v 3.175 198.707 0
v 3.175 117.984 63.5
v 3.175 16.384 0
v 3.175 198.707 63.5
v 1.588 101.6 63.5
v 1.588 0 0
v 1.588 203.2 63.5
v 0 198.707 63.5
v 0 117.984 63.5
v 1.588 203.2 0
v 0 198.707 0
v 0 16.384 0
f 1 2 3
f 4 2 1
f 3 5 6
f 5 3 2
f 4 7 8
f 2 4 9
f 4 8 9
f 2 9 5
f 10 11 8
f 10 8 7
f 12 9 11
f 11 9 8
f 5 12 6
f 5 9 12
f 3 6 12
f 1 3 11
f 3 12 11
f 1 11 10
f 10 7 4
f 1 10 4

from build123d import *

# Parameters (mm, degrees)
BOSS_EXTRUDE1_DEPTH     = 3.175
CUT_EXTRUDE1_DEPTH      = 120.85362166
CUT_EXTRUDE1_DEPTH_BACK = 120.85362166
CUT_EXTRUDE2_DEPTH      = 213.914467862
CUT_EXTRUDE2_DEPTH_BACK = 213.914467862


with BuildPart() as part:
    # Sketch1 → Boss-Extrude1 (new body)
    with BuildSketch(Plane.YZ):
        Polygon((0, 0), (203.2, 0), (203.2, 63.5), (101.6, 63.5), align=None)
    extrude(amount=BOSS_EXTRUDE1_DEPTH)

    # Sketch2 → Cut-Extrude1 (cut, two sides: drawn at the far end of the back side and taken through both)
    with BuildSketch(Plane(origin=(0, 101.6, 63.5), x_dir=(-1, 0, 0), z_dir=(0, 0.8479983040050879, 0.52999894000318)).offset(-CUT_EXTRUDE1_DEPTH_BACK)):
        Polygon((-3.175, -8.683746968), (-3.175, 1.50596977), (0, 1.50596977), (0, -8.683746968), (-1.5875, 0), align=None)
    extrude(amount=CUT_EXTRUDE1_DEPTH + CUT_EXTRUDE1_DEPTH_BACK, mode=Mode.SUBTRACT)

    # Sketch3 → Cut-Extrude2 (cut, two sides: drawn at the far end of the back side and taken through both)
    with BuildSketch(Plane.XY.offset(63.5).offset(-CUT_EXTRUDE2_DEPTH_BACK)):
        Polygon((0, 198.707072367), (1.5875, 203.2), (3.175, 198.707072367), (3.175, 209.769975366), (0, 209.769975366), align=None)
    extrude(amount=CUT_EXTRUDE2_DEPTH + CUT_EXTRUDE2_DEPTH_BACK, mode=Mode.SUBTRACT)


solid = part.part
